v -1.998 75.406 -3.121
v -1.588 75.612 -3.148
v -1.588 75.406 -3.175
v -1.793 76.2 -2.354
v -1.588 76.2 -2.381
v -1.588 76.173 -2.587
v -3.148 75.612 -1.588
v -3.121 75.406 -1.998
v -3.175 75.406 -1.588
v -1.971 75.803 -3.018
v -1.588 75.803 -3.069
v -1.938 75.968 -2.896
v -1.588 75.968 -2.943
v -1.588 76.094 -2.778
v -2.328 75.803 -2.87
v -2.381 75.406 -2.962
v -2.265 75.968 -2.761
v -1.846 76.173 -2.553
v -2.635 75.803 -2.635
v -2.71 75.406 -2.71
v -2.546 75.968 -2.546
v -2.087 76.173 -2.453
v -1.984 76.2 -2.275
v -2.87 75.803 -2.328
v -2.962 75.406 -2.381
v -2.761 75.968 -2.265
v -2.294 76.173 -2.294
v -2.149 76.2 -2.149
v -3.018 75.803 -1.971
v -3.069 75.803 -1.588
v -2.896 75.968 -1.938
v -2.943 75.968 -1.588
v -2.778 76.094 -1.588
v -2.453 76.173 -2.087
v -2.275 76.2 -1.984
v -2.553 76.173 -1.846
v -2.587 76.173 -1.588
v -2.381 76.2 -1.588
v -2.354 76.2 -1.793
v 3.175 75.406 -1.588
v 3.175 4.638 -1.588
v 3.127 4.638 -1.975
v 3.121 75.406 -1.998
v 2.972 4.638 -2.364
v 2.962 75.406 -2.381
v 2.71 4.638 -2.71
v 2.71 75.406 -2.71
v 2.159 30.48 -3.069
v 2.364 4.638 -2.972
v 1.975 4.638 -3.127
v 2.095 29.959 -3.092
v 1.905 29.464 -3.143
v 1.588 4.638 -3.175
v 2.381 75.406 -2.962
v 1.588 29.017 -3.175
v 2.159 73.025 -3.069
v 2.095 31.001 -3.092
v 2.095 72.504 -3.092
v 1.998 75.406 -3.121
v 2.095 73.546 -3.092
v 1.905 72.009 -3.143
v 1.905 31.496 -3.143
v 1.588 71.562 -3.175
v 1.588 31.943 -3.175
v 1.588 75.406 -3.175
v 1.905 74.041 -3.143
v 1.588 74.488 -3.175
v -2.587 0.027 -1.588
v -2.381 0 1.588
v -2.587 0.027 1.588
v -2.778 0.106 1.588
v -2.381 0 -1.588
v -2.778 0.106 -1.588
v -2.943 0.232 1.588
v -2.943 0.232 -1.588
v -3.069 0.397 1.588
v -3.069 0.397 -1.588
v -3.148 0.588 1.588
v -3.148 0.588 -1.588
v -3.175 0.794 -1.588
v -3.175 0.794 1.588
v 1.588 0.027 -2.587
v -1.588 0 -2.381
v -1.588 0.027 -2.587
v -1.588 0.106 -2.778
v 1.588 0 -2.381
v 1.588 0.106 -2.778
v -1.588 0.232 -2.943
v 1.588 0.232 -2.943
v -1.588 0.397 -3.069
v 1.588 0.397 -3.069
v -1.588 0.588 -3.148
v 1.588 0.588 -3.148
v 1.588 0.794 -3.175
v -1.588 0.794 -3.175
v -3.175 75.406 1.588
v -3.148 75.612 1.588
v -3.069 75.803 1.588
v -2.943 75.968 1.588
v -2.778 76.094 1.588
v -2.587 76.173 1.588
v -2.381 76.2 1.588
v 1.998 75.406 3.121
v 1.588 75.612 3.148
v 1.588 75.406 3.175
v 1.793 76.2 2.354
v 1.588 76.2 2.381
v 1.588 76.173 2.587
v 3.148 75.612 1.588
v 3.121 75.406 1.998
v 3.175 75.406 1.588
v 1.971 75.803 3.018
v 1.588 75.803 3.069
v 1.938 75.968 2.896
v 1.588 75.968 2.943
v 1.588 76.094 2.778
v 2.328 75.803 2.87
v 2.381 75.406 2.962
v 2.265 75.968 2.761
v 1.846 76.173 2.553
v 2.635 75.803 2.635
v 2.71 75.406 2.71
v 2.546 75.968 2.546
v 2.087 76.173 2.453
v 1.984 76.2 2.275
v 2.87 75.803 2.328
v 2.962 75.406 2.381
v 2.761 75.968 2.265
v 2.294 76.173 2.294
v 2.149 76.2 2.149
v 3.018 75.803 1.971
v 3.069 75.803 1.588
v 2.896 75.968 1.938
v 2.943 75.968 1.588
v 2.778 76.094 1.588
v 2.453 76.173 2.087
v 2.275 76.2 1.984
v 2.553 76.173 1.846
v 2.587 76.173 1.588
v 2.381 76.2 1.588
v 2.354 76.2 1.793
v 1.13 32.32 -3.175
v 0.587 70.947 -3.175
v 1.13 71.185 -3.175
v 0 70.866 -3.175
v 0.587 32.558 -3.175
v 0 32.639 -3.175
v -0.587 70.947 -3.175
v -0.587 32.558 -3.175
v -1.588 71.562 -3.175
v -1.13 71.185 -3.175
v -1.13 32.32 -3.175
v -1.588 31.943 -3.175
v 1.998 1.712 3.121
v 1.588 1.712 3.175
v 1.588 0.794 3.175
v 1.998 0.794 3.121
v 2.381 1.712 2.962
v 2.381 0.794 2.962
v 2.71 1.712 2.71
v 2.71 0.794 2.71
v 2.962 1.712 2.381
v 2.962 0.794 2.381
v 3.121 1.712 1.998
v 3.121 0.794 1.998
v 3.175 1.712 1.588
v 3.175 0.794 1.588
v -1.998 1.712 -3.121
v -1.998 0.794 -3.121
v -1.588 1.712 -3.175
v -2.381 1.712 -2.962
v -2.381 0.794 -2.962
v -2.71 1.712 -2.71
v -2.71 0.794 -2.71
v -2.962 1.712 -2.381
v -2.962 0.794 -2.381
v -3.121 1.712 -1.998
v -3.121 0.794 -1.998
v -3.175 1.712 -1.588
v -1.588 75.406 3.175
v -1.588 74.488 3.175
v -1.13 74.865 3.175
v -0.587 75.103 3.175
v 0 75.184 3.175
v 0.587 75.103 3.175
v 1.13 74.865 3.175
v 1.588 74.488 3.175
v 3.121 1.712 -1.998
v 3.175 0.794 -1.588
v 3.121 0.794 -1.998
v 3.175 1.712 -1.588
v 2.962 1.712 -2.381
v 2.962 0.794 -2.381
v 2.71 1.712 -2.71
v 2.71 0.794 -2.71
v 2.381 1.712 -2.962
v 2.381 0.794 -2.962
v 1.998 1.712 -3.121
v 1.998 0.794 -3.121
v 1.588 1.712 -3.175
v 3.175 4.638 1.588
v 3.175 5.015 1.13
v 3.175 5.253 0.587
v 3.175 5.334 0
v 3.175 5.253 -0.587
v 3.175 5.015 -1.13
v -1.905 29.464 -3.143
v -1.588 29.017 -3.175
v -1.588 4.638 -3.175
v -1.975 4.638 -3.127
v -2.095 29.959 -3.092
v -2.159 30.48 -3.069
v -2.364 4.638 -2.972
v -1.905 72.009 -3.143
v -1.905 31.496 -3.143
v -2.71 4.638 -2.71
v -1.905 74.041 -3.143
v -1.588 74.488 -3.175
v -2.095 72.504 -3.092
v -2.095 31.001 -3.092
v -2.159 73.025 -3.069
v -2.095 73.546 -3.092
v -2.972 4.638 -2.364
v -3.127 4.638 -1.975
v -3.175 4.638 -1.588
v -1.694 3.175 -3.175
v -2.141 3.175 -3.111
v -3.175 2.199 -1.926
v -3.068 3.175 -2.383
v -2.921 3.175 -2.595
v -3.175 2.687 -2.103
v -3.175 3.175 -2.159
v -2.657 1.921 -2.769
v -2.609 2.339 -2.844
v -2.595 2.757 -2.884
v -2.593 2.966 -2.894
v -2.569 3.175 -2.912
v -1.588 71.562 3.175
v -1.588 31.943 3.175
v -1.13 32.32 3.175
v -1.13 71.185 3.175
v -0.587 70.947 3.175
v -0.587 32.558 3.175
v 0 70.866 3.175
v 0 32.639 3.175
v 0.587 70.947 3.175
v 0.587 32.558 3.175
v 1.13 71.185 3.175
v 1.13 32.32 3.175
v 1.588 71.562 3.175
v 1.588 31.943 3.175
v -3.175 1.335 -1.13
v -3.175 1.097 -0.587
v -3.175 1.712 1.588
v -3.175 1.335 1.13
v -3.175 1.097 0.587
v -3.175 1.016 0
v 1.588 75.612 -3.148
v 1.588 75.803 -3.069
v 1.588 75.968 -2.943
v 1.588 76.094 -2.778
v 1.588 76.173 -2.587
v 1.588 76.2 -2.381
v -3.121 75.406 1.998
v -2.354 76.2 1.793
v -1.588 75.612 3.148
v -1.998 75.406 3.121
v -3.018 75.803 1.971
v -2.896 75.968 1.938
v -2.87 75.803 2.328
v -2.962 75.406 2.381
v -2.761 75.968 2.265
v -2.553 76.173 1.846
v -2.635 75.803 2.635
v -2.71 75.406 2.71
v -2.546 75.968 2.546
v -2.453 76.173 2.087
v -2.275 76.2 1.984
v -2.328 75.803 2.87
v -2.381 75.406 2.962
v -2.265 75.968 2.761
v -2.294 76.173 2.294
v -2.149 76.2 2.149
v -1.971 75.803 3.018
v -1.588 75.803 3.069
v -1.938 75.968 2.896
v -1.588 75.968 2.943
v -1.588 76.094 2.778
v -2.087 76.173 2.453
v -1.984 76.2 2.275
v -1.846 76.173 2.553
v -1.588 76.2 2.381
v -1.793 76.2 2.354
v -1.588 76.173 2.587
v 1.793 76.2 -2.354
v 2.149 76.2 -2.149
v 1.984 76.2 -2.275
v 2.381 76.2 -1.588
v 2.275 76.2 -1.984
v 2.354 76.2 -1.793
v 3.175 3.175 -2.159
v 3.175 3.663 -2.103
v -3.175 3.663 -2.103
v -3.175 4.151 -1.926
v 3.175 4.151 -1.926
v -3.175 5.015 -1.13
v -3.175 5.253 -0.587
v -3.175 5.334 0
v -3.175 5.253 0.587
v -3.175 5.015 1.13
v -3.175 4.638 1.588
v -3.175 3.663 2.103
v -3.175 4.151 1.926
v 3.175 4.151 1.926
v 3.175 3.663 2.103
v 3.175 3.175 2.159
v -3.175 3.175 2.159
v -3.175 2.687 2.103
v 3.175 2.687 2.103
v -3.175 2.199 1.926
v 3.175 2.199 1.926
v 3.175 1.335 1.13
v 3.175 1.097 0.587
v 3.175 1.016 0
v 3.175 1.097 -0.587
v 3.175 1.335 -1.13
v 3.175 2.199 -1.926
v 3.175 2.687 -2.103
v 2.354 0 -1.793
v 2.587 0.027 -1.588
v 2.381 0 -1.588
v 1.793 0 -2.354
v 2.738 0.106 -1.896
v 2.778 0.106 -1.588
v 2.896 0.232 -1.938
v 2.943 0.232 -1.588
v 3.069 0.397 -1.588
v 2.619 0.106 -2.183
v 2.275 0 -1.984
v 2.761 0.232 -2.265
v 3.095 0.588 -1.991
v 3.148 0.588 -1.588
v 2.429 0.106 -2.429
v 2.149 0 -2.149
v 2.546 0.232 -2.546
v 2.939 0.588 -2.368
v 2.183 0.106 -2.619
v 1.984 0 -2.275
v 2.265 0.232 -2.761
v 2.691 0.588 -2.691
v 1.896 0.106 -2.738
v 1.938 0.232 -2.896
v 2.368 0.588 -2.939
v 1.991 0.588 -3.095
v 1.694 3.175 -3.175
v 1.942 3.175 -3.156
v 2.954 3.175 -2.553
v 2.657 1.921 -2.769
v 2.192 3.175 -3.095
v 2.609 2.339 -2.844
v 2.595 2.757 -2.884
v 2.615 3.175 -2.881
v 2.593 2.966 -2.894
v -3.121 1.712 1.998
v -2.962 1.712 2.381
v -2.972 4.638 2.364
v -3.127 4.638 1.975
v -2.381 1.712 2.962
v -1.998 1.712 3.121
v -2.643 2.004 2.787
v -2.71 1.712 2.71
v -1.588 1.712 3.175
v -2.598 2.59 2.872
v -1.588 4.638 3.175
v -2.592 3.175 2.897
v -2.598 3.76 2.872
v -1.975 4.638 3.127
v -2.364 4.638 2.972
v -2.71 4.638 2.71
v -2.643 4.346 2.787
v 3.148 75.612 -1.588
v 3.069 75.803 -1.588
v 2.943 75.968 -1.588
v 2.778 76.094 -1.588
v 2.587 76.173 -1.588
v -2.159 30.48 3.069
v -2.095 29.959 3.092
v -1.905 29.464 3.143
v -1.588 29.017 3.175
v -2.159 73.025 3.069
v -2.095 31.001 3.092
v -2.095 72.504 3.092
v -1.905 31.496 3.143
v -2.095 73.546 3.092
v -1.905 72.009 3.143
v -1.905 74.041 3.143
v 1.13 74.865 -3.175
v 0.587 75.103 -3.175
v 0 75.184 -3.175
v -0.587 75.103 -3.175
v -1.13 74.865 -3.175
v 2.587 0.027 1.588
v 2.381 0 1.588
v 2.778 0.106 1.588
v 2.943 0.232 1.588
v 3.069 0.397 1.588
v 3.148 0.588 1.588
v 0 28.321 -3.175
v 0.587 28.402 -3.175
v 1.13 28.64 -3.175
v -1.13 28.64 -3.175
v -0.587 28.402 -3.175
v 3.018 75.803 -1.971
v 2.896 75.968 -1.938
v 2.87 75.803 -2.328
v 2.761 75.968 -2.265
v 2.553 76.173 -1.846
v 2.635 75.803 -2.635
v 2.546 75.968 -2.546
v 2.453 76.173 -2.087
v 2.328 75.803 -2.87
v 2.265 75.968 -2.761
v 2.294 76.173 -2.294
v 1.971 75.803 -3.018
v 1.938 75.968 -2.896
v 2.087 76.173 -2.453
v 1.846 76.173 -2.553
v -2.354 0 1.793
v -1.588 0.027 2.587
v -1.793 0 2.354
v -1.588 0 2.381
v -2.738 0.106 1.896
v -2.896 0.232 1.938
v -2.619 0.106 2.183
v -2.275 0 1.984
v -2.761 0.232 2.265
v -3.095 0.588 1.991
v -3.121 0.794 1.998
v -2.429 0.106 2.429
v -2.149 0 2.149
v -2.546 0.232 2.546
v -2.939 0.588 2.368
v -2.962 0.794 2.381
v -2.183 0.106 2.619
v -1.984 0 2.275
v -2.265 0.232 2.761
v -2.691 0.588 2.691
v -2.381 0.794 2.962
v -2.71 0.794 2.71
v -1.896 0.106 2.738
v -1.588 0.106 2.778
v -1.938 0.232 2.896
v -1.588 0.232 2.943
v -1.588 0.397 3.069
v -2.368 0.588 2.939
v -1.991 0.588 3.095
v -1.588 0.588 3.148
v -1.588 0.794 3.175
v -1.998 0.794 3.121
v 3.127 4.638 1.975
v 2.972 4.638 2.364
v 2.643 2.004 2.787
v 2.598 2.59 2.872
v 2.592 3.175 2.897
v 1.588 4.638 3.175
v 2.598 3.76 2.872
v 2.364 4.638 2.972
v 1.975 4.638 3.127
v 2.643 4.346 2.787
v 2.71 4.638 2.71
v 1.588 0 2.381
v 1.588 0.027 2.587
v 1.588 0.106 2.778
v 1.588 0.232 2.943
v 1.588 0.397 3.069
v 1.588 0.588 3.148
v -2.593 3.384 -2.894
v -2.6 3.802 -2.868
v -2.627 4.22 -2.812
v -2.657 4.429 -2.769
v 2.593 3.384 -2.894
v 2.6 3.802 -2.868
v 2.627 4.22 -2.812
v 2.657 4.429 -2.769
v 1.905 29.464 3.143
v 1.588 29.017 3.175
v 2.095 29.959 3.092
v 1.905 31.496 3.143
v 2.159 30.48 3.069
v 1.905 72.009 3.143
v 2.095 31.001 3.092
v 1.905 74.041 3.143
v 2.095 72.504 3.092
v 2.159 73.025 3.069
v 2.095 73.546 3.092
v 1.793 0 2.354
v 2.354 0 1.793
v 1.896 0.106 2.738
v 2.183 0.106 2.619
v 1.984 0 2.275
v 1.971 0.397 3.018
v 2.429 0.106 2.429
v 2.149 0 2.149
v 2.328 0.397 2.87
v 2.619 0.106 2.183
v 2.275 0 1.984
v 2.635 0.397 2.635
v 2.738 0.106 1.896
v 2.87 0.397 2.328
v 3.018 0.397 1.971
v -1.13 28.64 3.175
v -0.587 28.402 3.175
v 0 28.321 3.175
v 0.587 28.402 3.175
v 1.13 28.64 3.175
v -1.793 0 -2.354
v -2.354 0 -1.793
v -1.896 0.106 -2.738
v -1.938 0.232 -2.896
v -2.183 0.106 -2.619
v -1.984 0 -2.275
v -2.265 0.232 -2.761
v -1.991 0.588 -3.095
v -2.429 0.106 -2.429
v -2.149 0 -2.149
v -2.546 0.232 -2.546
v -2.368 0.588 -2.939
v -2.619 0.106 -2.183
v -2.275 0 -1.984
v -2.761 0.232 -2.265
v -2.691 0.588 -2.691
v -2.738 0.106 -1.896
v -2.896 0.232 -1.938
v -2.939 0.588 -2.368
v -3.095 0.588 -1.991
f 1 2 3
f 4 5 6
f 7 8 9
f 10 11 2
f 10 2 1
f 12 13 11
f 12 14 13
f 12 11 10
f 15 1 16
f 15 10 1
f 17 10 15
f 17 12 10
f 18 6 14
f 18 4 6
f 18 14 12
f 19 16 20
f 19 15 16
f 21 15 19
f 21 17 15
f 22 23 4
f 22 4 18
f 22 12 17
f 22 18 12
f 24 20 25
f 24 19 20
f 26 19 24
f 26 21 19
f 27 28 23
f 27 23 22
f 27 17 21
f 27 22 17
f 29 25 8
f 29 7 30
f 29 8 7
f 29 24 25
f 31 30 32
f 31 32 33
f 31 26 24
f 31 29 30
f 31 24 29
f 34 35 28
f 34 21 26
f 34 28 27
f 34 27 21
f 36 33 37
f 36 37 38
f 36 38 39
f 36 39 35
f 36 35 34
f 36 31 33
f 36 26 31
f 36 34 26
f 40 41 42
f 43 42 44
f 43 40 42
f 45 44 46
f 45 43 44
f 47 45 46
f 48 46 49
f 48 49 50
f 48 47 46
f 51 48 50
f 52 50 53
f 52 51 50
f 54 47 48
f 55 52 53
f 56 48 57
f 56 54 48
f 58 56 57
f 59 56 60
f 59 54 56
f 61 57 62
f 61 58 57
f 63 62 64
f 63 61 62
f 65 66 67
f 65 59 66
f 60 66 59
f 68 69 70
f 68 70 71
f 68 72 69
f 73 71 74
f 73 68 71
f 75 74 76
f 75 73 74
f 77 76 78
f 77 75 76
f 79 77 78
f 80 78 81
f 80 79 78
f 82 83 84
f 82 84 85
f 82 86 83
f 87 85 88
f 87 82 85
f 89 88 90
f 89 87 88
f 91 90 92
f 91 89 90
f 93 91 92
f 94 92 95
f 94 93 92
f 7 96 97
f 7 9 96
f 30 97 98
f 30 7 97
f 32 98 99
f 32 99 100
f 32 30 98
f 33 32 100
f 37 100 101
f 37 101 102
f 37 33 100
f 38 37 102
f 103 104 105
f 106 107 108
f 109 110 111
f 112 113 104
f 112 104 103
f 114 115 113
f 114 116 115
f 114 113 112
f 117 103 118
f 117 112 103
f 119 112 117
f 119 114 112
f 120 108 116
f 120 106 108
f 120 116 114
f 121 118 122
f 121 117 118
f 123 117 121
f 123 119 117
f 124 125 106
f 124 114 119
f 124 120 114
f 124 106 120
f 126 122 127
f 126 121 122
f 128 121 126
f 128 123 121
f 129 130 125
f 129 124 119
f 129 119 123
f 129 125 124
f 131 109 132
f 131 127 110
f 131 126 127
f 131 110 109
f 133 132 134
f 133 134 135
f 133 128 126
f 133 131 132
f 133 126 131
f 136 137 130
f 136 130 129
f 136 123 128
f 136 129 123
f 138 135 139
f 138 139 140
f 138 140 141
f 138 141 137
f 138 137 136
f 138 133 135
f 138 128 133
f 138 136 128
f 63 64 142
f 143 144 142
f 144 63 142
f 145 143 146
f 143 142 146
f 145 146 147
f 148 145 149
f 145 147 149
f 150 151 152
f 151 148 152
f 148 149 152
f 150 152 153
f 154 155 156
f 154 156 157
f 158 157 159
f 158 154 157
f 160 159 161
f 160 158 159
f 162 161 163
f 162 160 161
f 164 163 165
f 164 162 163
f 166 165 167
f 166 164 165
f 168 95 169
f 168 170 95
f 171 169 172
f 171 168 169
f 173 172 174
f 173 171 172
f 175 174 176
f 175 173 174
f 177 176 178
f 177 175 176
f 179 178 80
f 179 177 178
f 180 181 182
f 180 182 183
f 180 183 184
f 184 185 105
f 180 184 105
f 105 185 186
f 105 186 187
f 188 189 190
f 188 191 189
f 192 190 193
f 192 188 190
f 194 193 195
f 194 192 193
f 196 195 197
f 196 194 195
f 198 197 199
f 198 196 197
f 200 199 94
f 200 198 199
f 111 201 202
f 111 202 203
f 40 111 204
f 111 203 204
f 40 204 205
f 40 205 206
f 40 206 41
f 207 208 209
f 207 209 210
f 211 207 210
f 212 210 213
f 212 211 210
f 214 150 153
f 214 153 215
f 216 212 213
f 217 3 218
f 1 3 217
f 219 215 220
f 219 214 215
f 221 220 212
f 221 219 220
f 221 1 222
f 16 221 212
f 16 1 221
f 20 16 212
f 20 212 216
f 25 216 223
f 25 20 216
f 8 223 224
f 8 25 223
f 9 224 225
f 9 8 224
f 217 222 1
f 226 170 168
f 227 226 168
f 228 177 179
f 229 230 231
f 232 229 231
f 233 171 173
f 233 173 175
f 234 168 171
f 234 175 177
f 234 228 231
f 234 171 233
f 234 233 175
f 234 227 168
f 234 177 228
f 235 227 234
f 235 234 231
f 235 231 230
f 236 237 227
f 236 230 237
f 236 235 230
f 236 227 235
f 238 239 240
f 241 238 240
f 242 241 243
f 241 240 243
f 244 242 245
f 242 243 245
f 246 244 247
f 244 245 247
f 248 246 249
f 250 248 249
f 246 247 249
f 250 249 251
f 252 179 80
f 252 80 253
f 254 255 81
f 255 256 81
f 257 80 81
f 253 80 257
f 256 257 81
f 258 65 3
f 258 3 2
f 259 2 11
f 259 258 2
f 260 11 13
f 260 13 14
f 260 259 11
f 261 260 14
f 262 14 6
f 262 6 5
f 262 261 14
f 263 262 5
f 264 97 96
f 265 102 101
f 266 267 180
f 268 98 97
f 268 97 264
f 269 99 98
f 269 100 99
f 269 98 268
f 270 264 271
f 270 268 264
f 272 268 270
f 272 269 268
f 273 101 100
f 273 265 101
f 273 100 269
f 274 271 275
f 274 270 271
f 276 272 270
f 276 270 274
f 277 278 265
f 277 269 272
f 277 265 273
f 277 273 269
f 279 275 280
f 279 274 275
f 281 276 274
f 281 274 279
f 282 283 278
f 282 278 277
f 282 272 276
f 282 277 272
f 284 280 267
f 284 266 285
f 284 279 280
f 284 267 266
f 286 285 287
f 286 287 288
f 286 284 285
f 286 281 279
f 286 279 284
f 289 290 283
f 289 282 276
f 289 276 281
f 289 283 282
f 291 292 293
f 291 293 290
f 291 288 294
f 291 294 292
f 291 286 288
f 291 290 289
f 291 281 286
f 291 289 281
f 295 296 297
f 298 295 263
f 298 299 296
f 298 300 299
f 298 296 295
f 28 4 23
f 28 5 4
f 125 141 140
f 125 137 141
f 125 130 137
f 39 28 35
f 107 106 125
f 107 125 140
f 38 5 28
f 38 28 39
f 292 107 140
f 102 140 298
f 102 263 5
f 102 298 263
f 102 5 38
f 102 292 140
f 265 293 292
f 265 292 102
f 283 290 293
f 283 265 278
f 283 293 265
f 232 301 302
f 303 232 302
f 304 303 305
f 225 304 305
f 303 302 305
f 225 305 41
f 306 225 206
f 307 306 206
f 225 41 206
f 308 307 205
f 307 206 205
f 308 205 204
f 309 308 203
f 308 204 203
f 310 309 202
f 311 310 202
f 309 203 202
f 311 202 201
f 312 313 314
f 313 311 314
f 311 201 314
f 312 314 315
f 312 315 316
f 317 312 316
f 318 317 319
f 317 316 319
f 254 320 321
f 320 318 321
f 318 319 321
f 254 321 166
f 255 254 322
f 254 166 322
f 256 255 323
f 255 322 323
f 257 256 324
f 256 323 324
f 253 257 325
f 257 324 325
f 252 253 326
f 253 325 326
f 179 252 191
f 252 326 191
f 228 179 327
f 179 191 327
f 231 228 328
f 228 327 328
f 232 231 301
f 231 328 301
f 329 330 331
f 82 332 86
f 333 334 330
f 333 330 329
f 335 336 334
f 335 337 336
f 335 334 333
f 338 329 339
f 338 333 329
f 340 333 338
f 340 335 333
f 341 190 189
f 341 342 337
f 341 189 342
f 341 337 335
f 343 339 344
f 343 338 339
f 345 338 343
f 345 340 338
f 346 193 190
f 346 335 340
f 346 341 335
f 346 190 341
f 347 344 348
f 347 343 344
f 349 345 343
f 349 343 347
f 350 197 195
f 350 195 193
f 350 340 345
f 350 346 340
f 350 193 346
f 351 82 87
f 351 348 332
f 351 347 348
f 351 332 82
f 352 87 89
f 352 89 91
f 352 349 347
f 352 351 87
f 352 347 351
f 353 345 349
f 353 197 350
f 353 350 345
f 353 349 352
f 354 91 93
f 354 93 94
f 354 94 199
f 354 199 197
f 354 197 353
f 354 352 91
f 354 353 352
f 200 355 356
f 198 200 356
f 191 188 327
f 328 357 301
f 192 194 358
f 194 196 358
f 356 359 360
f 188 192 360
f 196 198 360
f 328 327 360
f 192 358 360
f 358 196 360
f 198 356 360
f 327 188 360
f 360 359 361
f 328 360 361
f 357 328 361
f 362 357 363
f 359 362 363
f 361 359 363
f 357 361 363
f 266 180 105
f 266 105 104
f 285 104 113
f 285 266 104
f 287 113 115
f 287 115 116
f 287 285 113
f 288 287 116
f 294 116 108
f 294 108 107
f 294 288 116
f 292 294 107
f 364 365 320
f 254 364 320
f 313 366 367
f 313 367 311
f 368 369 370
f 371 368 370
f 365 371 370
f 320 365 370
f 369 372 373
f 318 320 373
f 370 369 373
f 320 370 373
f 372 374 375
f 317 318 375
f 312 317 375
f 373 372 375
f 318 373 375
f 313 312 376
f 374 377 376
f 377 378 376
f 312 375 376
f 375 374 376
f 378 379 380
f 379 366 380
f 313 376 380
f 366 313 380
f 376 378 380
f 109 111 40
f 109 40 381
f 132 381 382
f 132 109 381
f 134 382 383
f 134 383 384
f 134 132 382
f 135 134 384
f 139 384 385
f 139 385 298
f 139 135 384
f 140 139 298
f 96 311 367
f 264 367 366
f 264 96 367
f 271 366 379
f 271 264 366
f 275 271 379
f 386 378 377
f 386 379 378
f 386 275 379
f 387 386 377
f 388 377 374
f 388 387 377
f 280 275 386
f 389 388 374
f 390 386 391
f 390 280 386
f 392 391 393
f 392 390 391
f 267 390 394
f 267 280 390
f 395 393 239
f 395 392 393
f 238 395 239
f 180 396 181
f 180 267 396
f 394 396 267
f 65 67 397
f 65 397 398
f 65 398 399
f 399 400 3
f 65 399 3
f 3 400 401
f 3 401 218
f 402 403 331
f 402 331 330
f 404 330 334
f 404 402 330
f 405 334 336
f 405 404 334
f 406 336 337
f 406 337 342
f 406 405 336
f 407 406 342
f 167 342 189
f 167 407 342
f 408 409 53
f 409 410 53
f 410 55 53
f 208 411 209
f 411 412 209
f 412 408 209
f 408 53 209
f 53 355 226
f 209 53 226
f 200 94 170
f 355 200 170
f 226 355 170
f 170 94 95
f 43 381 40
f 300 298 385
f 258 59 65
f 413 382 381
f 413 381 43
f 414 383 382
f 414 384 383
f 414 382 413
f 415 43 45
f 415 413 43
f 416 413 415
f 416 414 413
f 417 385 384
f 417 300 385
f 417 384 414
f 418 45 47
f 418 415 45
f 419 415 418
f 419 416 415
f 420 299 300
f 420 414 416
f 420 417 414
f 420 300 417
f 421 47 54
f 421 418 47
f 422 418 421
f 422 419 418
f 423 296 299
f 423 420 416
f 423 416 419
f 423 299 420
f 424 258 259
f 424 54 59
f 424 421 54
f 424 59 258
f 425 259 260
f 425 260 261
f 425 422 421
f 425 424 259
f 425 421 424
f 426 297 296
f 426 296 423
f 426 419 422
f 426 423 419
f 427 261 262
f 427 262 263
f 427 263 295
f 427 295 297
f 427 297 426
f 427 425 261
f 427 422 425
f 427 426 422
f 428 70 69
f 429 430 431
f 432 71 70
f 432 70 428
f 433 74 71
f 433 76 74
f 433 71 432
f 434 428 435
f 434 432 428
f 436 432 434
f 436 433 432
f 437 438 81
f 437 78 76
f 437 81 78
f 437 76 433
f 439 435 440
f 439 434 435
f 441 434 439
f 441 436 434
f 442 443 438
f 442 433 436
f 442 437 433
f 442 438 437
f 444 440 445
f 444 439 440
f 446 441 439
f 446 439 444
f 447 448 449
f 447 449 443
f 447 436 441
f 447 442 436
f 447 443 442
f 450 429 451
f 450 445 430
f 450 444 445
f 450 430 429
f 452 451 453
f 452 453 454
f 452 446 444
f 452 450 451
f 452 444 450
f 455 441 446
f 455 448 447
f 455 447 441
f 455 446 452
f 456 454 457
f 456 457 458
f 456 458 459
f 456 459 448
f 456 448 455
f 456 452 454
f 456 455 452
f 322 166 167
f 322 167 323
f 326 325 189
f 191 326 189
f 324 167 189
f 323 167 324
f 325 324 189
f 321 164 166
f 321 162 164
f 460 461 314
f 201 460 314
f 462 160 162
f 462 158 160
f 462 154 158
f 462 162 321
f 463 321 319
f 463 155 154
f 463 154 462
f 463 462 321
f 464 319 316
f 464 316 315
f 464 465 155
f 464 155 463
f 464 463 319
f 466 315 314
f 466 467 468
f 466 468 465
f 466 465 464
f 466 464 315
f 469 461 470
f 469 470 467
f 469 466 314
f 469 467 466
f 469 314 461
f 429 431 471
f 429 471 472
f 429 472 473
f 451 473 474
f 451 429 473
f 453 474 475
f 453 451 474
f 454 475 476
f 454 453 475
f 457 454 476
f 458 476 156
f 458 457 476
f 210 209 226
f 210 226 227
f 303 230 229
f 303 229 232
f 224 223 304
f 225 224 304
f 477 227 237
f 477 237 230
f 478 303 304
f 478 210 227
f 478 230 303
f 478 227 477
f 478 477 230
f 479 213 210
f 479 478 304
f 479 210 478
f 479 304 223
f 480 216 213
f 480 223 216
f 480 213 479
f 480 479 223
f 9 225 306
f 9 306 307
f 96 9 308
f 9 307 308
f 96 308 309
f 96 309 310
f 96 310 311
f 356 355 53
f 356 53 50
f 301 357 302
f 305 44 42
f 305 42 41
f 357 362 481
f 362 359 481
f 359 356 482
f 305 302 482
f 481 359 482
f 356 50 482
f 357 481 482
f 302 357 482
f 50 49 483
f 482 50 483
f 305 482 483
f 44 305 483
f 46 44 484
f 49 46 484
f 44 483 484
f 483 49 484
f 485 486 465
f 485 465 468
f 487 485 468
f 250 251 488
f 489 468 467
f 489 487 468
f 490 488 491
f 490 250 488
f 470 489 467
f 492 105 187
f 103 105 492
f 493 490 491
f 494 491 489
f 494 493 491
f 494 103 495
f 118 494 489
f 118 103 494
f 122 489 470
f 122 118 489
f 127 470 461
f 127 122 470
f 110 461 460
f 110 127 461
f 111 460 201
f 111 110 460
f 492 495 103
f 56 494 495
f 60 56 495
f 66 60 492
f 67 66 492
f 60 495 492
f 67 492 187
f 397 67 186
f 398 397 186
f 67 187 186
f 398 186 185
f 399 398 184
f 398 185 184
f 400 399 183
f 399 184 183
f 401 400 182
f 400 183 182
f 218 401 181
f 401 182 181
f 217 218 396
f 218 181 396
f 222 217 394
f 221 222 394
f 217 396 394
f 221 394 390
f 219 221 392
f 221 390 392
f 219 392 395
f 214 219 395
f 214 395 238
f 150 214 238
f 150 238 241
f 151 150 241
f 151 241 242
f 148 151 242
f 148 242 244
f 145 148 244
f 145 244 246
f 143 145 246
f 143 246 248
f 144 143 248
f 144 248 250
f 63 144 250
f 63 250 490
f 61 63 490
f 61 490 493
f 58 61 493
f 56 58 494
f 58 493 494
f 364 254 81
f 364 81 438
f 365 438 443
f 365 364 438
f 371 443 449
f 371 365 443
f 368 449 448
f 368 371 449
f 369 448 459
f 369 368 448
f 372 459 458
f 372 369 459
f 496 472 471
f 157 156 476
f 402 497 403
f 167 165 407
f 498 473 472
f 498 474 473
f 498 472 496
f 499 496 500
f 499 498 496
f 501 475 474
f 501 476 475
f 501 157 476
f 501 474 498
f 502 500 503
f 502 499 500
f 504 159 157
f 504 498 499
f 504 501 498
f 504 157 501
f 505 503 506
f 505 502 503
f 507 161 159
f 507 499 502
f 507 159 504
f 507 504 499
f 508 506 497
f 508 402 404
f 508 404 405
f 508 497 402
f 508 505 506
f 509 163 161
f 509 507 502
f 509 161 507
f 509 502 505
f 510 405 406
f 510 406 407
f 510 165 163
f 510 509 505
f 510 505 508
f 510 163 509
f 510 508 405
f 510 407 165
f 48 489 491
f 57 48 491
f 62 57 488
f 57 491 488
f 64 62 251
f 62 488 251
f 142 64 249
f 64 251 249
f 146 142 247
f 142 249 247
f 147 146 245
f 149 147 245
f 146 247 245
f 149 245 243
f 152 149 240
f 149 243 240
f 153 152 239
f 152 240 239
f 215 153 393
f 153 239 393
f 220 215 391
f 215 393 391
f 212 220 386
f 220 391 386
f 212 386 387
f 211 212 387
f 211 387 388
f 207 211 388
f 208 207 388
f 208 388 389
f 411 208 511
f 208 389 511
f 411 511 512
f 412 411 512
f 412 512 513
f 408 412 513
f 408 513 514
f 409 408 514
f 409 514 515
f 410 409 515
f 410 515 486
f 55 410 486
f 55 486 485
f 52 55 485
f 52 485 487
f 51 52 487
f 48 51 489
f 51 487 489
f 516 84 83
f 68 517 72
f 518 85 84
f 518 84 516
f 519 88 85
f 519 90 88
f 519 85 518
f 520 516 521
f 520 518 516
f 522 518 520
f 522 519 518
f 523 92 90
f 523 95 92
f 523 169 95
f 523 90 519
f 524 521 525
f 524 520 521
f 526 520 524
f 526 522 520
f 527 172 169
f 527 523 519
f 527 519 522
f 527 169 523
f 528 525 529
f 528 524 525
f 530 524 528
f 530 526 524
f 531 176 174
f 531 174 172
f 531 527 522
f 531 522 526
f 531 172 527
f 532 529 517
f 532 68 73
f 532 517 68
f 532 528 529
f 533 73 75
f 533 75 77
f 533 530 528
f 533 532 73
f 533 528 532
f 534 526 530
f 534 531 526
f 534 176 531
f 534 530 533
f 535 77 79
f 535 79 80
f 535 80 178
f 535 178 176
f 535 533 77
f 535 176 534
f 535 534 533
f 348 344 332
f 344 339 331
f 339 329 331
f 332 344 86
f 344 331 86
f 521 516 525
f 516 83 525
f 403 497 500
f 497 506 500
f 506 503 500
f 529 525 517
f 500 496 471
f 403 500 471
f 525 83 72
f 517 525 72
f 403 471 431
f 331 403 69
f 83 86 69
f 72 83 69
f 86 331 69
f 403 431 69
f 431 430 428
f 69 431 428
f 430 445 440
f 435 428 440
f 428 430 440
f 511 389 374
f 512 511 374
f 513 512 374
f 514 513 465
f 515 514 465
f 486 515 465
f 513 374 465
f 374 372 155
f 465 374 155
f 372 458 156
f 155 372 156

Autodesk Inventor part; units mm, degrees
ref_plane "YZ Plane" through (0, 0, 0) normal (1, 0, 0) x (0, 1, 0)
ref_plane "XZ Plane" through (0, 0, 0) normal (0, 1, 0) x (-1, 0, 0)
ref_plane "XY Plane" through (0, 0, 0) normal (0, 0, 1) x (1, 0, 0)
sketch "Sketch1" plane through (0, 0, 0) normal (0, 1, 0) x (-1, 0, 0)
  line L0 (-3.175, -3.175) -> (3.175, -3.175)
  line L1 (3.175, -3.175) -> (3.175, 3.175)
  line L2 (3.175, 3.175) -> (-3.175, 3.175)
  line L3 (-3.175, 3.175) -> (-3.175, -3.175)
  line L4 (-3.175, -3.175) -> (3.175, 3.175) construction
  line L5 (3.175, -3.175) -> (-3.175, 3.175) construction
  point P0 (0, 0)
  dimension "d0" = 6.35
  dimension "d1" = 6.35
extrude "Extrusion1" add sketch "Sketch1" along normal blind 76.2
sketch "Sketch2" plane through (3.175, 0, 3.175) normal (1, 0, 0) x (0, 0, -1)
  circle A0 centre (3.175, 3.175) radius 2.159
  line L0 (0, 0) -> (6.35, 0) projected
  point P0 (3.175, 0)
  dimension "d4" = 4.318
  dimension "d5" = 3.175
extrude "Extrusion2" cut sketch "Sketch2" against normal blind 76.2
fillet "Fillet1" radius 1.5875 4 edges at (3.175, 38.1, -3.175) (-3.175, 38.1, -3.175) (3.175, 38.1, 3.175) (-3.175, 38.1, 3.175)
fillet "Fillet2" radius 0.7937 16 edges at (2.71, 0, 2.71) (3.175, 0, 0) (2.71, 0, -2.71) (0, 0, -3.175) (-2.71, 0, -2.71) (-3.175, 0, 0) (-2.71, 0, 2.71) (0, 0, 3.175) (2.71, 76.2, 2.71) (3.175, 76.2, 0) (2.71, 76.2, -2.71) (0, 76.2, -3.175) (-2.71, 76.2, -2.71) (-3.175, 76.2, 0) (-2.71, 76.2, 2.71) (0, 76.2, 3.175)
sketch "Sketch3" plane through (-1.5875, 75.4062, 3.175) normal (0, 0, 1) x (1, 0, 0)
  circle A0 centre (1.5875, -44.9263) radius 2.159
  line L0 (0, -75.4062) -> (3.175, -75.4062) projected
  point P0 (1.5875, -75.4062)
  dimension "d10" = 4.318
  dimension "d11" = 30.48
extrude "Extrusion3" cut sketch "Sketch3" against normal blind 76.2
sketch "Sketch4" plane through (-1.5875, 75.4062, 3.175) normal (0, 0, 1) x (1, 0, 0)
  circle A0 centre (1.5875, -2.3813) radius 2.159
  line L0 (3.175, 0.7937) -> (0, 0.7937) projected
  point P0 (1.5875, -75.4062)
  dimension "d14" = 4.318
  dimension "d15" = 3.175
extrude "Extrusion4" cut sketch "Sketch4" against normal blind 76.2
properties part number "beam" material "Stainless Steel"
